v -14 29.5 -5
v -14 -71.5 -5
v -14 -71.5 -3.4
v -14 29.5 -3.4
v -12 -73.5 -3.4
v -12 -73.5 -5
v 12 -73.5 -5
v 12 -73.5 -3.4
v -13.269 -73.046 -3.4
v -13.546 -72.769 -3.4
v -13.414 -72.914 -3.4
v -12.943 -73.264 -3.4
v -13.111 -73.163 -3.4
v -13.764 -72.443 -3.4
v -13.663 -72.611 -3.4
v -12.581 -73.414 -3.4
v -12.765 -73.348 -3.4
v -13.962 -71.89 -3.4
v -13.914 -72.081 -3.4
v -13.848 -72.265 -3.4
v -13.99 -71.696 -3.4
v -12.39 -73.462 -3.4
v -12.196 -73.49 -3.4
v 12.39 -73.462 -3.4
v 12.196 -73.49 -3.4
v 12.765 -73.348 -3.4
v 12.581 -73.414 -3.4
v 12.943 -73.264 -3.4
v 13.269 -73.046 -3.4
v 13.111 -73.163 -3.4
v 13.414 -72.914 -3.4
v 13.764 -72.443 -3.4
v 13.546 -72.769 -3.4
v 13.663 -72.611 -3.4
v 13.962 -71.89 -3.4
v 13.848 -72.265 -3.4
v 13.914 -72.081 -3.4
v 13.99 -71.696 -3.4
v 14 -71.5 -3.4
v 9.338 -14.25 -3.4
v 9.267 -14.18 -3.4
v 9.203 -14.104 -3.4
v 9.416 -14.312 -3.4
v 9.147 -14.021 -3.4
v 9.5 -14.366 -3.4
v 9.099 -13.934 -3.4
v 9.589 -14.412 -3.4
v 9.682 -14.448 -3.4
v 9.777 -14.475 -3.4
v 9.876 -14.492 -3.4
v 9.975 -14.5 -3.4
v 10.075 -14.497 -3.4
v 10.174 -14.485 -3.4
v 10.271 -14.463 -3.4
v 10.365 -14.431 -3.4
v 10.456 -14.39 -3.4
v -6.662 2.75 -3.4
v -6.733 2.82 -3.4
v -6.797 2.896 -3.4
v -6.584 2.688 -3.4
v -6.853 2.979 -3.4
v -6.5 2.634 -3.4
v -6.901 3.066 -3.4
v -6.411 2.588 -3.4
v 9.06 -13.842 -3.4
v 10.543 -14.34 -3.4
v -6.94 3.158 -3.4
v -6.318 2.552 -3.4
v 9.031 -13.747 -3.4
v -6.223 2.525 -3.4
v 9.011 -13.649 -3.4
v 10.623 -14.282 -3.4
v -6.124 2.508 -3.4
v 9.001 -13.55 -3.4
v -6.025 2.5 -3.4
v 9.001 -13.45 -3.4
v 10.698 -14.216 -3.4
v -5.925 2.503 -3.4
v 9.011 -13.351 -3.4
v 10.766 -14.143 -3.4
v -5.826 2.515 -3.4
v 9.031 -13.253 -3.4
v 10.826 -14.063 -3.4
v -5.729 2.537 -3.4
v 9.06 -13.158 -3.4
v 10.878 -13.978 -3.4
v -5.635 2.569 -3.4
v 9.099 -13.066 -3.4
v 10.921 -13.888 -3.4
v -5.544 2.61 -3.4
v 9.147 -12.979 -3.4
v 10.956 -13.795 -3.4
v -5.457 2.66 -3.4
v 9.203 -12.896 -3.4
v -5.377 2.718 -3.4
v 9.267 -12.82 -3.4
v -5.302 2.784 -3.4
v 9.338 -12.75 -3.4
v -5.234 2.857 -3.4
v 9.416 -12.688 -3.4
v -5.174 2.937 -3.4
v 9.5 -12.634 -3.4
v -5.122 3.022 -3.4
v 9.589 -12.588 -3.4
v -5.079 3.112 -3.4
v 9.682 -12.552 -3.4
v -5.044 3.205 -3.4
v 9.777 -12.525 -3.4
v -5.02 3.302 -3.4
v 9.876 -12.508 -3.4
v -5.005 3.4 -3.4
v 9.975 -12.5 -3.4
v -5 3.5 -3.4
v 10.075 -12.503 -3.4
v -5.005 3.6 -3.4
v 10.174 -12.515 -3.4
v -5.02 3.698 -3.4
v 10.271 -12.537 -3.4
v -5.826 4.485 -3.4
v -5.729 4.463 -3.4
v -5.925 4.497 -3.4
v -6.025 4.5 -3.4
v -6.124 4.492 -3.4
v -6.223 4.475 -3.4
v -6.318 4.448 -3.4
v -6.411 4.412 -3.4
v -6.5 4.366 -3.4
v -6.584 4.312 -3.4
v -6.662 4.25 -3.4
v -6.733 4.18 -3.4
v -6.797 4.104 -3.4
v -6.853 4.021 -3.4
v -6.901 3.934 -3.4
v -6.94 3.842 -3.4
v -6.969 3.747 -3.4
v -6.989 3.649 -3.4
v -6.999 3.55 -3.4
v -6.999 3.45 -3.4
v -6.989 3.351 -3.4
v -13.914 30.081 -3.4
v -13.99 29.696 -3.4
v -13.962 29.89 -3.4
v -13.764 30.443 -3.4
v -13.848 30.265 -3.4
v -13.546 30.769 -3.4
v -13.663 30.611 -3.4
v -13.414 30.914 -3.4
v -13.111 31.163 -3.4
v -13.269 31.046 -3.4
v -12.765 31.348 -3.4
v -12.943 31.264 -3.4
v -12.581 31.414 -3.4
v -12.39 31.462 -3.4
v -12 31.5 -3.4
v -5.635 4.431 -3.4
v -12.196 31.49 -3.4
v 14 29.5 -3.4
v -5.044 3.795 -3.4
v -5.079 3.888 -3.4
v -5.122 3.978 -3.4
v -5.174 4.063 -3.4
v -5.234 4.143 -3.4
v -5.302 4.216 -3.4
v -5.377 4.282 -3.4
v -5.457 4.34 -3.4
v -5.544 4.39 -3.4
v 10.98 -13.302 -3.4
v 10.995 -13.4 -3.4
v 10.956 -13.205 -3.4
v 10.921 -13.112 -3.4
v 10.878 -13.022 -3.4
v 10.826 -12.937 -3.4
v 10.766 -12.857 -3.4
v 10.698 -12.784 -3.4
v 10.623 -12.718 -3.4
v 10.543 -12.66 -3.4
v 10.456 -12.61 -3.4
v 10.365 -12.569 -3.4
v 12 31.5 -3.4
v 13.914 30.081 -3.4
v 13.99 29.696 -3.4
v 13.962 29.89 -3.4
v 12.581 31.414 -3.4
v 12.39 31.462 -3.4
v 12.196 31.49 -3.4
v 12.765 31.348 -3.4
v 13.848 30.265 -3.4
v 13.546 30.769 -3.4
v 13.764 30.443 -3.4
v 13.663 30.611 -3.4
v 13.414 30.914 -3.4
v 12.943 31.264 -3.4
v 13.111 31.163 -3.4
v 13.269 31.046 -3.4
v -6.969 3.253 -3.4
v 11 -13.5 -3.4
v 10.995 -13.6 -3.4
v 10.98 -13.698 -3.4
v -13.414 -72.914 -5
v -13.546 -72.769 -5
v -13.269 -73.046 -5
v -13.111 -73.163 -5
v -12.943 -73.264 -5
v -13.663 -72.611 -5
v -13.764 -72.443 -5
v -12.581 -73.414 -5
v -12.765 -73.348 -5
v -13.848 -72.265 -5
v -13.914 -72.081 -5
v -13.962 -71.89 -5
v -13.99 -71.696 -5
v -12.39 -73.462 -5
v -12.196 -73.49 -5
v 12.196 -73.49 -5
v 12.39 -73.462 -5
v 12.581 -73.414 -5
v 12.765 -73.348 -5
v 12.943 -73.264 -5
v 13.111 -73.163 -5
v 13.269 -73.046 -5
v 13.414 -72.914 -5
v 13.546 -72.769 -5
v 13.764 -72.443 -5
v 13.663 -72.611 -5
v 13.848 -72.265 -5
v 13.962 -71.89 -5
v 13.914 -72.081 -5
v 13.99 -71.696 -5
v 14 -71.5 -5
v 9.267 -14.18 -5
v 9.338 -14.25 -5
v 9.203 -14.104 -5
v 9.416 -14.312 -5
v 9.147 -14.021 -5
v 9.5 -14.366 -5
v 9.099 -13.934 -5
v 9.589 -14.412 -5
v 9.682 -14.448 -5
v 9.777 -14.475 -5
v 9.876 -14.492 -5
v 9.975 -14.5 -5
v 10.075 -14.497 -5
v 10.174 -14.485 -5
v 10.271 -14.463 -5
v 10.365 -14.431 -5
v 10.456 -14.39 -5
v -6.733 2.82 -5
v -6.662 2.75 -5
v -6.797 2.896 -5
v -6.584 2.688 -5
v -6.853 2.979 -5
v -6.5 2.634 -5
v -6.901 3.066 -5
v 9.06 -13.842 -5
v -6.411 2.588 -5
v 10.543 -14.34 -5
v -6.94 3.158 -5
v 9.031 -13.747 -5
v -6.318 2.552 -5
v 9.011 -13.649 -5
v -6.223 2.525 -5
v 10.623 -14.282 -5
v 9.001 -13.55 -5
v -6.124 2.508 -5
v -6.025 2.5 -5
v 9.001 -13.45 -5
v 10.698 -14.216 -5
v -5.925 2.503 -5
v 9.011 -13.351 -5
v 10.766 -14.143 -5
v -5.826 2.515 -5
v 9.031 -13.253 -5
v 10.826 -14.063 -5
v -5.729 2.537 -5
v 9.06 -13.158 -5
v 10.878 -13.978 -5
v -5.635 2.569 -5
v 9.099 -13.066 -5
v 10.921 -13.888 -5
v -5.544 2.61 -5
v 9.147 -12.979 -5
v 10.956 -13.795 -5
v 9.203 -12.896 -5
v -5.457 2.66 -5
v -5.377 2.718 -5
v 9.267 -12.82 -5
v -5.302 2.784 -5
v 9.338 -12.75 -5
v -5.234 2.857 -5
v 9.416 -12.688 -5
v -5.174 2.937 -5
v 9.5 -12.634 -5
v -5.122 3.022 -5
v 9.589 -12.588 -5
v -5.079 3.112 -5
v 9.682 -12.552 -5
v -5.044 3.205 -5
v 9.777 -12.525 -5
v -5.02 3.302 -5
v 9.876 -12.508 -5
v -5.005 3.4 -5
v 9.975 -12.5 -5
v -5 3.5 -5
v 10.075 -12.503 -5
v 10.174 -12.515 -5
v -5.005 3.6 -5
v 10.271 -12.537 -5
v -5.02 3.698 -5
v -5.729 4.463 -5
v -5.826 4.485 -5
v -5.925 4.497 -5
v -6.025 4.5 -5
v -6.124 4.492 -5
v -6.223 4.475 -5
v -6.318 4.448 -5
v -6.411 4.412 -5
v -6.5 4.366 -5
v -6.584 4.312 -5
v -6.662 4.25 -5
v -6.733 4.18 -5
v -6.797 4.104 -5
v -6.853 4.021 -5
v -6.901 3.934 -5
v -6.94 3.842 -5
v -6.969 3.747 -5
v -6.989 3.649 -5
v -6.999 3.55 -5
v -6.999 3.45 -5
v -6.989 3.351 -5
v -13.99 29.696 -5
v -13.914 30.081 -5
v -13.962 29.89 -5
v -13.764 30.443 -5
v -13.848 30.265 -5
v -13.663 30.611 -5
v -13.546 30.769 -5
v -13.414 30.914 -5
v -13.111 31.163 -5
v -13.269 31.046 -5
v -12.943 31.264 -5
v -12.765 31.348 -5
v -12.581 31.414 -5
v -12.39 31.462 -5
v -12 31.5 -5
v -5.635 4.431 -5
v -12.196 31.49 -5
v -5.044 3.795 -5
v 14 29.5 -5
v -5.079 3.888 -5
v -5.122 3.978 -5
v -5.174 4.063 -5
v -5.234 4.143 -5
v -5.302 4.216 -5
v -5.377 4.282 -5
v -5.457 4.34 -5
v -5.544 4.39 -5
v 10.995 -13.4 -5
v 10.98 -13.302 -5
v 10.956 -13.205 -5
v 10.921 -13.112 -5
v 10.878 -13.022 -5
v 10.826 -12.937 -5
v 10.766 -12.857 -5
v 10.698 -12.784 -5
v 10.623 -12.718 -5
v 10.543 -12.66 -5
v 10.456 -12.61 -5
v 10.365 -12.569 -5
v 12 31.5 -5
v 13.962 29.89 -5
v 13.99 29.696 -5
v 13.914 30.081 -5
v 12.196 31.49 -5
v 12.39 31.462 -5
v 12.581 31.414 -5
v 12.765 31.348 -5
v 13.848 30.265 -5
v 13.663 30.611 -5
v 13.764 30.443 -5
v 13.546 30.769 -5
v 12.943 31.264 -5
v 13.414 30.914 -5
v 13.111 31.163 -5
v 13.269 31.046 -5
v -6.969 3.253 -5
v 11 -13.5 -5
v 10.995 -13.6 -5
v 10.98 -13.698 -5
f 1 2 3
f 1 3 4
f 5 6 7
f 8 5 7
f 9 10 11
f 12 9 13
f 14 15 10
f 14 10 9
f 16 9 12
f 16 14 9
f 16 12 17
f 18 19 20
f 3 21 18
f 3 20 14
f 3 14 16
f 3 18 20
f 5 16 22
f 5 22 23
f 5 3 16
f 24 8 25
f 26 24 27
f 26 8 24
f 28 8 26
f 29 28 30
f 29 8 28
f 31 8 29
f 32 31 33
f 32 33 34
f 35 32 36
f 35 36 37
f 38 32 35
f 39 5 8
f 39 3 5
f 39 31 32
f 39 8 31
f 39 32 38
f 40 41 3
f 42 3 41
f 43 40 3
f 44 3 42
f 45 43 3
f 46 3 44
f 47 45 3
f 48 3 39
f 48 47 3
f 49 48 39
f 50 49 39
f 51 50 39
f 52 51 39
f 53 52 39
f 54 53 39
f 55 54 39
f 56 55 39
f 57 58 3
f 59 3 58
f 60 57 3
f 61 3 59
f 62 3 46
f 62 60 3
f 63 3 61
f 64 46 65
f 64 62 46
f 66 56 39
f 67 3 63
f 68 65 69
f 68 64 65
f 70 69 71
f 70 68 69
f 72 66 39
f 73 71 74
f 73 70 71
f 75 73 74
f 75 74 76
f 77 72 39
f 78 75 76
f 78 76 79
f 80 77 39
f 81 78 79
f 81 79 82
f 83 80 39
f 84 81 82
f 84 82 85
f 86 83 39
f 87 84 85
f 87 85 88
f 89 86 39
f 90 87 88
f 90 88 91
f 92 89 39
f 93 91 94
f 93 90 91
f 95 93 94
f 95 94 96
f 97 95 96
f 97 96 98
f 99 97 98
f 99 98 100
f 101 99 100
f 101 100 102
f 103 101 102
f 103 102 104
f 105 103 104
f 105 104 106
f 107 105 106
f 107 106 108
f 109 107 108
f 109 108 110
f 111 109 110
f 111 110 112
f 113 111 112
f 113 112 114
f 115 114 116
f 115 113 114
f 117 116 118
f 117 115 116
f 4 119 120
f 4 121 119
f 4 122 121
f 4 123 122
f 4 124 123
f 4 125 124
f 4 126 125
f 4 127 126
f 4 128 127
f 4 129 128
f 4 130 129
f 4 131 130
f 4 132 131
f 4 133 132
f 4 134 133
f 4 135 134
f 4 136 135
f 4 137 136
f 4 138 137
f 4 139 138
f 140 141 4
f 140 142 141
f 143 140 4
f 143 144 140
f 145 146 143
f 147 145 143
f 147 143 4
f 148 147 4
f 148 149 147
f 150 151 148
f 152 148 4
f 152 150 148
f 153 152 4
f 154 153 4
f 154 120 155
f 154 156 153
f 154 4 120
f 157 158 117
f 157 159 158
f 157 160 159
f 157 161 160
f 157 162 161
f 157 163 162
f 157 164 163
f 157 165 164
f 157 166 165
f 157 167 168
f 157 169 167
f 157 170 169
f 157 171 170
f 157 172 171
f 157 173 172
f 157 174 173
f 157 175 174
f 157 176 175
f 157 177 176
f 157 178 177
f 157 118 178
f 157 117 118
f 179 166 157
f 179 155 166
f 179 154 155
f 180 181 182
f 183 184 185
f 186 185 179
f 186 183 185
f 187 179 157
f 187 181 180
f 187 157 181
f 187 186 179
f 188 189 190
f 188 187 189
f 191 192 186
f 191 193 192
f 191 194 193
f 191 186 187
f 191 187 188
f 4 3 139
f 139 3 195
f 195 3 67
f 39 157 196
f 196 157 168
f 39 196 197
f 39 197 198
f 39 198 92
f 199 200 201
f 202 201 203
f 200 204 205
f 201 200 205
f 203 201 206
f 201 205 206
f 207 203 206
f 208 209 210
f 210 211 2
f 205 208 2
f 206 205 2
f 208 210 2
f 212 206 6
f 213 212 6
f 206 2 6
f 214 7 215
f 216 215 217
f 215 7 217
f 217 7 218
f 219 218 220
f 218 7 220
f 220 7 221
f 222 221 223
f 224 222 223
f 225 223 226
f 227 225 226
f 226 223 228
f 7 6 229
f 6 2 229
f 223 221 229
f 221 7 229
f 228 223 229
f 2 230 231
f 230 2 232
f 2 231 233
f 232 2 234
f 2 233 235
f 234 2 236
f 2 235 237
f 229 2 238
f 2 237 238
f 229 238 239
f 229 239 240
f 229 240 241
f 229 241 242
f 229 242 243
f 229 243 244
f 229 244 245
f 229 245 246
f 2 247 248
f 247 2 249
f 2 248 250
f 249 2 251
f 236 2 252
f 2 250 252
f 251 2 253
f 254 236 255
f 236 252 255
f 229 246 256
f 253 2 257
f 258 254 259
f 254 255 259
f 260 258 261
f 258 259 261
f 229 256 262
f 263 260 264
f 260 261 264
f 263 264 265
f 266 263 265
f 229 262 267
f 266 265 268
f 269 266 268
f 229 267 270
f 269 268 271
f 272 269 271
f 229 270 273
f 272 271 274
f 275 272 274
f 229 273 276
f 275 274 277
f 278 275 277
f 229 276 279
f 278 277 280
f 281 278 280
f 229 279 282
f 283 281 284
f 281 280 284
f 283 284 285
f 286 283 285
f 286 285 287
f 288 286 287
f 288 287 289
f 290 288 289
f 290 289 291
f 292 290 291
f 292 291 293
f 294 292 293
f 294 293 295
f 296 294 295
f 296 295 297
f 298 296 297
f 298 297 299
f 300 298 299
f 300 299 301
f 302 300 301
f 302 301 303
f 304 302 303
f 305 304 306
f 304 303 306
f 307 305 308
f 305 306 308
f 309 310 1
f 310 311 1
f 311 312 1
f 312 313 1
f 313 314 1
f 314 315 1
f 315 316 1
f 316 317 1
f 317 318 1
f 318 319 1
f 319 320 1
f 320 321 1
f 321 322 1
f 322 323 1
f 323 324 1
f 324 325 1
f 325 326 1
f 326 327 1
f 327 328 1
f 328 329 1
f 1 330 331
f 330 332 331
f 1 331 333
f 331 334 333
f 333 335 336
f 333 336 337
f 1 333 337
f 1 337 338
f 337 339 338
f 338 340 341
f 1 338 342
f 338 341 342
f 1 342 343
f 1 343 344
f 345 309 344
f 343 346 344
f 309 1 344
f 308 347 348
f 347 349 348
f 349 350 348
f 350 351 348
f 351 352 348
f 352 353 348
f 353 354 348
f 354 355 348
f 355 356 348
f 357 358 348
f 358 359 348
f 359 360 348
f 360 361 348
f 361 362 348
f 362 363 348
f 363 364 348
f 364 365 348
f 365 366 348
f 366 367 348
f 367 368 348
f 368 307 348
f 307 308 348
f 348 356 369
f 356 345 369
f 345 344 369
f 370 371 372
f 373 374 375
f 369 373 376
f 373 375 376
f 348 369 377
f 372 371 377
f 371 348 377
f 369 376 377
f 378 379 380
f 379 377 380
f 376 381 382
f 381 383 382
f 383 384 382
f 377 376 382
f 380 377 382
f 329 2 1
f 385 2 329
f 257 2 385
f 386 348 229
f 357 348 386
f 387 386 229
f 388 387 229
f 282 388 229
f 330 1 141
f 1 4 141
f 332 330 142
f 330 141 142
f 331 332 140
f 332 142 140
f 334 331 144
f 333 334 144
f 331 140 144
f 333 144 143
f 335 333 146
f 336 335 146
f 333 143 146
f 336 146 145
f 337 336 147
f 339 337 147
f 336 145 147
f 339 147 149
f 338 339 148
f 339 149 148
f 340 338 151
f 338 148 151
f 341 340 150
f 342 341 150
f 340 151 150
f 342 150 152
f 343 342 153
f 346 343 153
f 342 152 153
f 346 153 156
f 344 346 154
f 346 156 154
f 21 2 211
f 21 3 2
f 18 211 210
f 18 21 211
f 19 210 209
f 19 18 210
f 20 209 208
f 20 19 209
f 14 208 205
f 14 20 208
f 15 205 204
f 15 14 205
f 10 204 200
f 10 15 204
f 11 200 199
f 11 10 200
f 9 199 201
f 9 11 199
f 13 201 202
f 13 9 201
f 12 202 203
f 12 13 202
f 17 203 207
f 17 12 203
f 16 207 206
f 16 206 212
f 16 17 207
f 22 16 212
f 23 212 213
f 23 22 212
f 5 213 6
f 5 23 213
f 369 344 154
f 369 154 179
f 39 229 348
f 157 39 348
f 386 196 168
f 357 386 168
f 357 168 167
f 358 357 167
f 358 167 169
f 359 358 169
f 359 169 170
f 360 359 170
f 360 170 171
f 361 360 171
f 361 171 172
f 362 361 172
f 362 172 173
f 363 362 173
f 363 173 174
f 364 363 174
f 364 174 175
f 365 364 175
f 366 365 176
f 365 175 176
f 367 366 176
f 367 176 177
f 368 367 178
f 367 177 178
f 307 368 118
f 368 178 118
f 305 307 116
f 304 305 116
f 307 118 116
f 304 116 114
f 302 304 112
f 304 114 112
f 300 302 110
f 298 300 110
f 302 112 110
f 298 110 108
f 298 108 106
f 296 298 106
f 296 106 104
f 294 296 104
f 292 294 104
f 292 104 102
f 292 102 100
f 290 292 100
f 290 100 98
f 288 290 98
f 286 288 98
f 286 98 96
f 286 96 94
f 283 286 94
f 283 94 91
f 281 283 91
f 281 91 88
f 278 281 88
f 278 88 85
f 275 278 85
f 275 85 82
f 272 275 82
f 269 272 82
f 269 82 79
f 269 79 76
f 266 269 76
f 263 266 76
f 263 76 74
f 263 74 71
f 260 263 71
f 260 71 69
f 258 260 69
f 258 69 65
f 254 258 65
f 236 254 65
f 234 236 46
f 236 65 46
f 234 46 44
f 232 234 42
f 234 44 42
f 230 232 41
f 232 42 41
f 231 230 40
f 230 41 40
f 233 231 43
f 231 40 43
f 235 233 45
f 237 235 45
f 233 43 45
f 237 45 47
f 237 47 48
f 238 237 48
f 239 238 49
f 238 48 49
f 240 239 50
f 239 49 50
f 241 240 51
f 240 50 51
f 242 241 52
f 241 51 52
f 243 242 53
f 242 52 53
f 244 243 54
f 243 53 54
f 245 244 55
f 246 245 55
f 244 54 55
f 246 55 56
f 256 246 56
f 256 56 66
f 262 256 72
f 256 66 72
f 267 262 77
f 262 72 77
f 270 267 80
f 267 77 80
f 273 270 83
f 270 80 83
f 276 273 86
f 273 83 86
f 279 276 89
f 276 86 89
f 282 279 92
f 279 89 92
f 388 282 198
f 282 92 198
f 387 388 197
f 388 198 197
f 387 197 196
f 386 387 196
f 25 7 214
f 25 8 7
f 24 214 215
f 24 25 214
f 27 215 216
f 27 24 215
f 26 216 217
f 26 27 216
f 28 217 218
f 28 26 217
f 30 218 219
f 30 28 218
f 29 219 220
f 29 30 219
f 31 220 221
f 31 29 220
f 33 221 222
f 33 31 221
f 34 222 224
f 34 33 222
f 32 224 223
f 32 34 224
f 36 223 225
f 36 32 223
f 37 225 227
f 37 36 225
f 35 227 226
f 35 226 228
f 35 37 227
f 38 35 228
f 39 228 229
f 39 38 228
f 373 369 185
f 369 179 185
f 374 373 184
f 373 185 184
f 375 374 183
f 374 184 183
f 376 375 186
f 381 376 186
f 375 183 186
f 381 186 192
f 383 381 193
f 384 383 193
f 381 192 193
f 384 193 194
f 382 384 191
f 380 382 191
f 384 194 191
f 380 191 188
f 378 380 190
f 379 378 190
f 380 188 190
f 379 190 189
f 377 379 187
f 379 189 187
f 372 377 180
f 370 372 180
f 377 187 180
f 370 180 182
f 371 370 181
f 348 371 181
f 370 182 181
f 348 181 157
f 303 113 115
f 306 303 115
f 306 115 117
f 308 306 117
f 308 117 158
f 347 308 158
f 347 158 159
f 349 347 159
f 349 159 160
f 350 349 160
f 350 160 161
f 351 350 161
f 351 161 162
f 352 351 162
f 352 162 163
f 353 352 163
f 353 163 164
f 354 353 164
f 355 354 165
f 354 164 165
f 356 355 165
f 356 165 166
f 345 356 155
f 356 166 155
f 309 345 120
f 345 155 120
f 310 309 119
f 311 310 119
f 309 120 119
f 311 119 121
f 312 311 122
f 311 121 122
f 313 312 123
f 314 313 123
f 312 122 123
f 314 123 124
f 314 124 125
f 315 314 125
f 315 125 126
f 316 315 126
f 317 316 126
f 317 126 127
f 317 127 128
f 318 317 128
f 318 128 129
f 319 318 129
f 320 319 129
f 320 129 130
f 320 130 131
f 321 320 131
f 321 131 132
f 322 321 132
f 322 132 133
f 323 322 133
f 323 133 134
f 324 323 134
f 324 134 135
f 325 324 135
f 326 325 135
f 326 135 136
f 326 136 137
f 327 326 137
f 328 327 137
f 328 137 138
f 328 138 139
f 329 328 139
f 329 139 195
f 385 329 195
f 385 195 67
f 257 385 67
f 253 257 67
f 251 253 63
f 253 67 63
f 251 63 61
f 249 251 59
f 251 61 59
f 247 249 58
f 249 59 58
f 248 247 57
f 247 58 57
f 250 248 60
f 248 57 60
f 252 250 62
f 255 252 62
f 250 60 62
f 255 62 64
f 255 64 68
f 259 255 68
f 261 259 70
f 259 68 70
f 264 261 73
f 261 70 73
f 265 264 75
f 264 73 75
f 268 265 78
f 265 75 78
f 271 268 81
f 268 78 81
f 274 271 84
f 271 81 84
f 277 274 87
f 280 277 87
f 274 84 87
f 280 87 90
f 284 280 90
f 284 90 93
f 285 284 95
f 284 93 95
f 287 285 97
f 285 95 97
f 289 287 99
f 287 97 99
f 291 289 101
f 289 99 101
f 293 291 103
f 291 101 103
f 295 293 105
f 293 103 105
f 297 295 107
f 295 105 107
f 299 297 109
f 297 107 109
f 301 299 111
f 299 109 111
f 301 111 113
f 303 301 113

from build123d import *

# Parameters (mm, degrees)
SKETCH172_W     = 28
SKETCH172_H     = 105
PAD044_DEPTH    = 1.6
SKETCH173_R     = 1
POCKET023_DEPTH = 5
FILLET020_R     = 2


with BuildPart() as part:
    # Sketch172 (on DatumPlane) → Pad044 (new body)
    with BuildSketch(Plane(origin=(0, 19.5, -5), x_dir=(1, 0, 0), z_dir=(0, 0, 1))):
        with Locations((0, -40.5)):
            Rectangle(SKETCH172_W, SKETCH172_H)
    extrude(amount=PAD044_DEPTH)

    # Sketch173 → Pocket023 (cut)
    with BuildSketch(Plane.XY):
        with Locations((10, -13.5)):
            Circle(SKETCH173_R)
        with Locations((-6, 3.5)):
            Circle(SKETCH173_R)
    extrude(amount=-POCKET023_DEPTH, mode=Mode.SUBTRACT)

    # Fillet020
    fillet020_edges = [part.edges().sort_by_distance(p)[0] for p in [
        (14, 31.5, -4.2),
        (-14, 31.5, -4.2),
        (14, -73.5, -4.2),
        (-14, -73.5, -4.2),
    ]]
    fillet(fillet020_edges, radius=FILLET020_R)


solid = part.part
